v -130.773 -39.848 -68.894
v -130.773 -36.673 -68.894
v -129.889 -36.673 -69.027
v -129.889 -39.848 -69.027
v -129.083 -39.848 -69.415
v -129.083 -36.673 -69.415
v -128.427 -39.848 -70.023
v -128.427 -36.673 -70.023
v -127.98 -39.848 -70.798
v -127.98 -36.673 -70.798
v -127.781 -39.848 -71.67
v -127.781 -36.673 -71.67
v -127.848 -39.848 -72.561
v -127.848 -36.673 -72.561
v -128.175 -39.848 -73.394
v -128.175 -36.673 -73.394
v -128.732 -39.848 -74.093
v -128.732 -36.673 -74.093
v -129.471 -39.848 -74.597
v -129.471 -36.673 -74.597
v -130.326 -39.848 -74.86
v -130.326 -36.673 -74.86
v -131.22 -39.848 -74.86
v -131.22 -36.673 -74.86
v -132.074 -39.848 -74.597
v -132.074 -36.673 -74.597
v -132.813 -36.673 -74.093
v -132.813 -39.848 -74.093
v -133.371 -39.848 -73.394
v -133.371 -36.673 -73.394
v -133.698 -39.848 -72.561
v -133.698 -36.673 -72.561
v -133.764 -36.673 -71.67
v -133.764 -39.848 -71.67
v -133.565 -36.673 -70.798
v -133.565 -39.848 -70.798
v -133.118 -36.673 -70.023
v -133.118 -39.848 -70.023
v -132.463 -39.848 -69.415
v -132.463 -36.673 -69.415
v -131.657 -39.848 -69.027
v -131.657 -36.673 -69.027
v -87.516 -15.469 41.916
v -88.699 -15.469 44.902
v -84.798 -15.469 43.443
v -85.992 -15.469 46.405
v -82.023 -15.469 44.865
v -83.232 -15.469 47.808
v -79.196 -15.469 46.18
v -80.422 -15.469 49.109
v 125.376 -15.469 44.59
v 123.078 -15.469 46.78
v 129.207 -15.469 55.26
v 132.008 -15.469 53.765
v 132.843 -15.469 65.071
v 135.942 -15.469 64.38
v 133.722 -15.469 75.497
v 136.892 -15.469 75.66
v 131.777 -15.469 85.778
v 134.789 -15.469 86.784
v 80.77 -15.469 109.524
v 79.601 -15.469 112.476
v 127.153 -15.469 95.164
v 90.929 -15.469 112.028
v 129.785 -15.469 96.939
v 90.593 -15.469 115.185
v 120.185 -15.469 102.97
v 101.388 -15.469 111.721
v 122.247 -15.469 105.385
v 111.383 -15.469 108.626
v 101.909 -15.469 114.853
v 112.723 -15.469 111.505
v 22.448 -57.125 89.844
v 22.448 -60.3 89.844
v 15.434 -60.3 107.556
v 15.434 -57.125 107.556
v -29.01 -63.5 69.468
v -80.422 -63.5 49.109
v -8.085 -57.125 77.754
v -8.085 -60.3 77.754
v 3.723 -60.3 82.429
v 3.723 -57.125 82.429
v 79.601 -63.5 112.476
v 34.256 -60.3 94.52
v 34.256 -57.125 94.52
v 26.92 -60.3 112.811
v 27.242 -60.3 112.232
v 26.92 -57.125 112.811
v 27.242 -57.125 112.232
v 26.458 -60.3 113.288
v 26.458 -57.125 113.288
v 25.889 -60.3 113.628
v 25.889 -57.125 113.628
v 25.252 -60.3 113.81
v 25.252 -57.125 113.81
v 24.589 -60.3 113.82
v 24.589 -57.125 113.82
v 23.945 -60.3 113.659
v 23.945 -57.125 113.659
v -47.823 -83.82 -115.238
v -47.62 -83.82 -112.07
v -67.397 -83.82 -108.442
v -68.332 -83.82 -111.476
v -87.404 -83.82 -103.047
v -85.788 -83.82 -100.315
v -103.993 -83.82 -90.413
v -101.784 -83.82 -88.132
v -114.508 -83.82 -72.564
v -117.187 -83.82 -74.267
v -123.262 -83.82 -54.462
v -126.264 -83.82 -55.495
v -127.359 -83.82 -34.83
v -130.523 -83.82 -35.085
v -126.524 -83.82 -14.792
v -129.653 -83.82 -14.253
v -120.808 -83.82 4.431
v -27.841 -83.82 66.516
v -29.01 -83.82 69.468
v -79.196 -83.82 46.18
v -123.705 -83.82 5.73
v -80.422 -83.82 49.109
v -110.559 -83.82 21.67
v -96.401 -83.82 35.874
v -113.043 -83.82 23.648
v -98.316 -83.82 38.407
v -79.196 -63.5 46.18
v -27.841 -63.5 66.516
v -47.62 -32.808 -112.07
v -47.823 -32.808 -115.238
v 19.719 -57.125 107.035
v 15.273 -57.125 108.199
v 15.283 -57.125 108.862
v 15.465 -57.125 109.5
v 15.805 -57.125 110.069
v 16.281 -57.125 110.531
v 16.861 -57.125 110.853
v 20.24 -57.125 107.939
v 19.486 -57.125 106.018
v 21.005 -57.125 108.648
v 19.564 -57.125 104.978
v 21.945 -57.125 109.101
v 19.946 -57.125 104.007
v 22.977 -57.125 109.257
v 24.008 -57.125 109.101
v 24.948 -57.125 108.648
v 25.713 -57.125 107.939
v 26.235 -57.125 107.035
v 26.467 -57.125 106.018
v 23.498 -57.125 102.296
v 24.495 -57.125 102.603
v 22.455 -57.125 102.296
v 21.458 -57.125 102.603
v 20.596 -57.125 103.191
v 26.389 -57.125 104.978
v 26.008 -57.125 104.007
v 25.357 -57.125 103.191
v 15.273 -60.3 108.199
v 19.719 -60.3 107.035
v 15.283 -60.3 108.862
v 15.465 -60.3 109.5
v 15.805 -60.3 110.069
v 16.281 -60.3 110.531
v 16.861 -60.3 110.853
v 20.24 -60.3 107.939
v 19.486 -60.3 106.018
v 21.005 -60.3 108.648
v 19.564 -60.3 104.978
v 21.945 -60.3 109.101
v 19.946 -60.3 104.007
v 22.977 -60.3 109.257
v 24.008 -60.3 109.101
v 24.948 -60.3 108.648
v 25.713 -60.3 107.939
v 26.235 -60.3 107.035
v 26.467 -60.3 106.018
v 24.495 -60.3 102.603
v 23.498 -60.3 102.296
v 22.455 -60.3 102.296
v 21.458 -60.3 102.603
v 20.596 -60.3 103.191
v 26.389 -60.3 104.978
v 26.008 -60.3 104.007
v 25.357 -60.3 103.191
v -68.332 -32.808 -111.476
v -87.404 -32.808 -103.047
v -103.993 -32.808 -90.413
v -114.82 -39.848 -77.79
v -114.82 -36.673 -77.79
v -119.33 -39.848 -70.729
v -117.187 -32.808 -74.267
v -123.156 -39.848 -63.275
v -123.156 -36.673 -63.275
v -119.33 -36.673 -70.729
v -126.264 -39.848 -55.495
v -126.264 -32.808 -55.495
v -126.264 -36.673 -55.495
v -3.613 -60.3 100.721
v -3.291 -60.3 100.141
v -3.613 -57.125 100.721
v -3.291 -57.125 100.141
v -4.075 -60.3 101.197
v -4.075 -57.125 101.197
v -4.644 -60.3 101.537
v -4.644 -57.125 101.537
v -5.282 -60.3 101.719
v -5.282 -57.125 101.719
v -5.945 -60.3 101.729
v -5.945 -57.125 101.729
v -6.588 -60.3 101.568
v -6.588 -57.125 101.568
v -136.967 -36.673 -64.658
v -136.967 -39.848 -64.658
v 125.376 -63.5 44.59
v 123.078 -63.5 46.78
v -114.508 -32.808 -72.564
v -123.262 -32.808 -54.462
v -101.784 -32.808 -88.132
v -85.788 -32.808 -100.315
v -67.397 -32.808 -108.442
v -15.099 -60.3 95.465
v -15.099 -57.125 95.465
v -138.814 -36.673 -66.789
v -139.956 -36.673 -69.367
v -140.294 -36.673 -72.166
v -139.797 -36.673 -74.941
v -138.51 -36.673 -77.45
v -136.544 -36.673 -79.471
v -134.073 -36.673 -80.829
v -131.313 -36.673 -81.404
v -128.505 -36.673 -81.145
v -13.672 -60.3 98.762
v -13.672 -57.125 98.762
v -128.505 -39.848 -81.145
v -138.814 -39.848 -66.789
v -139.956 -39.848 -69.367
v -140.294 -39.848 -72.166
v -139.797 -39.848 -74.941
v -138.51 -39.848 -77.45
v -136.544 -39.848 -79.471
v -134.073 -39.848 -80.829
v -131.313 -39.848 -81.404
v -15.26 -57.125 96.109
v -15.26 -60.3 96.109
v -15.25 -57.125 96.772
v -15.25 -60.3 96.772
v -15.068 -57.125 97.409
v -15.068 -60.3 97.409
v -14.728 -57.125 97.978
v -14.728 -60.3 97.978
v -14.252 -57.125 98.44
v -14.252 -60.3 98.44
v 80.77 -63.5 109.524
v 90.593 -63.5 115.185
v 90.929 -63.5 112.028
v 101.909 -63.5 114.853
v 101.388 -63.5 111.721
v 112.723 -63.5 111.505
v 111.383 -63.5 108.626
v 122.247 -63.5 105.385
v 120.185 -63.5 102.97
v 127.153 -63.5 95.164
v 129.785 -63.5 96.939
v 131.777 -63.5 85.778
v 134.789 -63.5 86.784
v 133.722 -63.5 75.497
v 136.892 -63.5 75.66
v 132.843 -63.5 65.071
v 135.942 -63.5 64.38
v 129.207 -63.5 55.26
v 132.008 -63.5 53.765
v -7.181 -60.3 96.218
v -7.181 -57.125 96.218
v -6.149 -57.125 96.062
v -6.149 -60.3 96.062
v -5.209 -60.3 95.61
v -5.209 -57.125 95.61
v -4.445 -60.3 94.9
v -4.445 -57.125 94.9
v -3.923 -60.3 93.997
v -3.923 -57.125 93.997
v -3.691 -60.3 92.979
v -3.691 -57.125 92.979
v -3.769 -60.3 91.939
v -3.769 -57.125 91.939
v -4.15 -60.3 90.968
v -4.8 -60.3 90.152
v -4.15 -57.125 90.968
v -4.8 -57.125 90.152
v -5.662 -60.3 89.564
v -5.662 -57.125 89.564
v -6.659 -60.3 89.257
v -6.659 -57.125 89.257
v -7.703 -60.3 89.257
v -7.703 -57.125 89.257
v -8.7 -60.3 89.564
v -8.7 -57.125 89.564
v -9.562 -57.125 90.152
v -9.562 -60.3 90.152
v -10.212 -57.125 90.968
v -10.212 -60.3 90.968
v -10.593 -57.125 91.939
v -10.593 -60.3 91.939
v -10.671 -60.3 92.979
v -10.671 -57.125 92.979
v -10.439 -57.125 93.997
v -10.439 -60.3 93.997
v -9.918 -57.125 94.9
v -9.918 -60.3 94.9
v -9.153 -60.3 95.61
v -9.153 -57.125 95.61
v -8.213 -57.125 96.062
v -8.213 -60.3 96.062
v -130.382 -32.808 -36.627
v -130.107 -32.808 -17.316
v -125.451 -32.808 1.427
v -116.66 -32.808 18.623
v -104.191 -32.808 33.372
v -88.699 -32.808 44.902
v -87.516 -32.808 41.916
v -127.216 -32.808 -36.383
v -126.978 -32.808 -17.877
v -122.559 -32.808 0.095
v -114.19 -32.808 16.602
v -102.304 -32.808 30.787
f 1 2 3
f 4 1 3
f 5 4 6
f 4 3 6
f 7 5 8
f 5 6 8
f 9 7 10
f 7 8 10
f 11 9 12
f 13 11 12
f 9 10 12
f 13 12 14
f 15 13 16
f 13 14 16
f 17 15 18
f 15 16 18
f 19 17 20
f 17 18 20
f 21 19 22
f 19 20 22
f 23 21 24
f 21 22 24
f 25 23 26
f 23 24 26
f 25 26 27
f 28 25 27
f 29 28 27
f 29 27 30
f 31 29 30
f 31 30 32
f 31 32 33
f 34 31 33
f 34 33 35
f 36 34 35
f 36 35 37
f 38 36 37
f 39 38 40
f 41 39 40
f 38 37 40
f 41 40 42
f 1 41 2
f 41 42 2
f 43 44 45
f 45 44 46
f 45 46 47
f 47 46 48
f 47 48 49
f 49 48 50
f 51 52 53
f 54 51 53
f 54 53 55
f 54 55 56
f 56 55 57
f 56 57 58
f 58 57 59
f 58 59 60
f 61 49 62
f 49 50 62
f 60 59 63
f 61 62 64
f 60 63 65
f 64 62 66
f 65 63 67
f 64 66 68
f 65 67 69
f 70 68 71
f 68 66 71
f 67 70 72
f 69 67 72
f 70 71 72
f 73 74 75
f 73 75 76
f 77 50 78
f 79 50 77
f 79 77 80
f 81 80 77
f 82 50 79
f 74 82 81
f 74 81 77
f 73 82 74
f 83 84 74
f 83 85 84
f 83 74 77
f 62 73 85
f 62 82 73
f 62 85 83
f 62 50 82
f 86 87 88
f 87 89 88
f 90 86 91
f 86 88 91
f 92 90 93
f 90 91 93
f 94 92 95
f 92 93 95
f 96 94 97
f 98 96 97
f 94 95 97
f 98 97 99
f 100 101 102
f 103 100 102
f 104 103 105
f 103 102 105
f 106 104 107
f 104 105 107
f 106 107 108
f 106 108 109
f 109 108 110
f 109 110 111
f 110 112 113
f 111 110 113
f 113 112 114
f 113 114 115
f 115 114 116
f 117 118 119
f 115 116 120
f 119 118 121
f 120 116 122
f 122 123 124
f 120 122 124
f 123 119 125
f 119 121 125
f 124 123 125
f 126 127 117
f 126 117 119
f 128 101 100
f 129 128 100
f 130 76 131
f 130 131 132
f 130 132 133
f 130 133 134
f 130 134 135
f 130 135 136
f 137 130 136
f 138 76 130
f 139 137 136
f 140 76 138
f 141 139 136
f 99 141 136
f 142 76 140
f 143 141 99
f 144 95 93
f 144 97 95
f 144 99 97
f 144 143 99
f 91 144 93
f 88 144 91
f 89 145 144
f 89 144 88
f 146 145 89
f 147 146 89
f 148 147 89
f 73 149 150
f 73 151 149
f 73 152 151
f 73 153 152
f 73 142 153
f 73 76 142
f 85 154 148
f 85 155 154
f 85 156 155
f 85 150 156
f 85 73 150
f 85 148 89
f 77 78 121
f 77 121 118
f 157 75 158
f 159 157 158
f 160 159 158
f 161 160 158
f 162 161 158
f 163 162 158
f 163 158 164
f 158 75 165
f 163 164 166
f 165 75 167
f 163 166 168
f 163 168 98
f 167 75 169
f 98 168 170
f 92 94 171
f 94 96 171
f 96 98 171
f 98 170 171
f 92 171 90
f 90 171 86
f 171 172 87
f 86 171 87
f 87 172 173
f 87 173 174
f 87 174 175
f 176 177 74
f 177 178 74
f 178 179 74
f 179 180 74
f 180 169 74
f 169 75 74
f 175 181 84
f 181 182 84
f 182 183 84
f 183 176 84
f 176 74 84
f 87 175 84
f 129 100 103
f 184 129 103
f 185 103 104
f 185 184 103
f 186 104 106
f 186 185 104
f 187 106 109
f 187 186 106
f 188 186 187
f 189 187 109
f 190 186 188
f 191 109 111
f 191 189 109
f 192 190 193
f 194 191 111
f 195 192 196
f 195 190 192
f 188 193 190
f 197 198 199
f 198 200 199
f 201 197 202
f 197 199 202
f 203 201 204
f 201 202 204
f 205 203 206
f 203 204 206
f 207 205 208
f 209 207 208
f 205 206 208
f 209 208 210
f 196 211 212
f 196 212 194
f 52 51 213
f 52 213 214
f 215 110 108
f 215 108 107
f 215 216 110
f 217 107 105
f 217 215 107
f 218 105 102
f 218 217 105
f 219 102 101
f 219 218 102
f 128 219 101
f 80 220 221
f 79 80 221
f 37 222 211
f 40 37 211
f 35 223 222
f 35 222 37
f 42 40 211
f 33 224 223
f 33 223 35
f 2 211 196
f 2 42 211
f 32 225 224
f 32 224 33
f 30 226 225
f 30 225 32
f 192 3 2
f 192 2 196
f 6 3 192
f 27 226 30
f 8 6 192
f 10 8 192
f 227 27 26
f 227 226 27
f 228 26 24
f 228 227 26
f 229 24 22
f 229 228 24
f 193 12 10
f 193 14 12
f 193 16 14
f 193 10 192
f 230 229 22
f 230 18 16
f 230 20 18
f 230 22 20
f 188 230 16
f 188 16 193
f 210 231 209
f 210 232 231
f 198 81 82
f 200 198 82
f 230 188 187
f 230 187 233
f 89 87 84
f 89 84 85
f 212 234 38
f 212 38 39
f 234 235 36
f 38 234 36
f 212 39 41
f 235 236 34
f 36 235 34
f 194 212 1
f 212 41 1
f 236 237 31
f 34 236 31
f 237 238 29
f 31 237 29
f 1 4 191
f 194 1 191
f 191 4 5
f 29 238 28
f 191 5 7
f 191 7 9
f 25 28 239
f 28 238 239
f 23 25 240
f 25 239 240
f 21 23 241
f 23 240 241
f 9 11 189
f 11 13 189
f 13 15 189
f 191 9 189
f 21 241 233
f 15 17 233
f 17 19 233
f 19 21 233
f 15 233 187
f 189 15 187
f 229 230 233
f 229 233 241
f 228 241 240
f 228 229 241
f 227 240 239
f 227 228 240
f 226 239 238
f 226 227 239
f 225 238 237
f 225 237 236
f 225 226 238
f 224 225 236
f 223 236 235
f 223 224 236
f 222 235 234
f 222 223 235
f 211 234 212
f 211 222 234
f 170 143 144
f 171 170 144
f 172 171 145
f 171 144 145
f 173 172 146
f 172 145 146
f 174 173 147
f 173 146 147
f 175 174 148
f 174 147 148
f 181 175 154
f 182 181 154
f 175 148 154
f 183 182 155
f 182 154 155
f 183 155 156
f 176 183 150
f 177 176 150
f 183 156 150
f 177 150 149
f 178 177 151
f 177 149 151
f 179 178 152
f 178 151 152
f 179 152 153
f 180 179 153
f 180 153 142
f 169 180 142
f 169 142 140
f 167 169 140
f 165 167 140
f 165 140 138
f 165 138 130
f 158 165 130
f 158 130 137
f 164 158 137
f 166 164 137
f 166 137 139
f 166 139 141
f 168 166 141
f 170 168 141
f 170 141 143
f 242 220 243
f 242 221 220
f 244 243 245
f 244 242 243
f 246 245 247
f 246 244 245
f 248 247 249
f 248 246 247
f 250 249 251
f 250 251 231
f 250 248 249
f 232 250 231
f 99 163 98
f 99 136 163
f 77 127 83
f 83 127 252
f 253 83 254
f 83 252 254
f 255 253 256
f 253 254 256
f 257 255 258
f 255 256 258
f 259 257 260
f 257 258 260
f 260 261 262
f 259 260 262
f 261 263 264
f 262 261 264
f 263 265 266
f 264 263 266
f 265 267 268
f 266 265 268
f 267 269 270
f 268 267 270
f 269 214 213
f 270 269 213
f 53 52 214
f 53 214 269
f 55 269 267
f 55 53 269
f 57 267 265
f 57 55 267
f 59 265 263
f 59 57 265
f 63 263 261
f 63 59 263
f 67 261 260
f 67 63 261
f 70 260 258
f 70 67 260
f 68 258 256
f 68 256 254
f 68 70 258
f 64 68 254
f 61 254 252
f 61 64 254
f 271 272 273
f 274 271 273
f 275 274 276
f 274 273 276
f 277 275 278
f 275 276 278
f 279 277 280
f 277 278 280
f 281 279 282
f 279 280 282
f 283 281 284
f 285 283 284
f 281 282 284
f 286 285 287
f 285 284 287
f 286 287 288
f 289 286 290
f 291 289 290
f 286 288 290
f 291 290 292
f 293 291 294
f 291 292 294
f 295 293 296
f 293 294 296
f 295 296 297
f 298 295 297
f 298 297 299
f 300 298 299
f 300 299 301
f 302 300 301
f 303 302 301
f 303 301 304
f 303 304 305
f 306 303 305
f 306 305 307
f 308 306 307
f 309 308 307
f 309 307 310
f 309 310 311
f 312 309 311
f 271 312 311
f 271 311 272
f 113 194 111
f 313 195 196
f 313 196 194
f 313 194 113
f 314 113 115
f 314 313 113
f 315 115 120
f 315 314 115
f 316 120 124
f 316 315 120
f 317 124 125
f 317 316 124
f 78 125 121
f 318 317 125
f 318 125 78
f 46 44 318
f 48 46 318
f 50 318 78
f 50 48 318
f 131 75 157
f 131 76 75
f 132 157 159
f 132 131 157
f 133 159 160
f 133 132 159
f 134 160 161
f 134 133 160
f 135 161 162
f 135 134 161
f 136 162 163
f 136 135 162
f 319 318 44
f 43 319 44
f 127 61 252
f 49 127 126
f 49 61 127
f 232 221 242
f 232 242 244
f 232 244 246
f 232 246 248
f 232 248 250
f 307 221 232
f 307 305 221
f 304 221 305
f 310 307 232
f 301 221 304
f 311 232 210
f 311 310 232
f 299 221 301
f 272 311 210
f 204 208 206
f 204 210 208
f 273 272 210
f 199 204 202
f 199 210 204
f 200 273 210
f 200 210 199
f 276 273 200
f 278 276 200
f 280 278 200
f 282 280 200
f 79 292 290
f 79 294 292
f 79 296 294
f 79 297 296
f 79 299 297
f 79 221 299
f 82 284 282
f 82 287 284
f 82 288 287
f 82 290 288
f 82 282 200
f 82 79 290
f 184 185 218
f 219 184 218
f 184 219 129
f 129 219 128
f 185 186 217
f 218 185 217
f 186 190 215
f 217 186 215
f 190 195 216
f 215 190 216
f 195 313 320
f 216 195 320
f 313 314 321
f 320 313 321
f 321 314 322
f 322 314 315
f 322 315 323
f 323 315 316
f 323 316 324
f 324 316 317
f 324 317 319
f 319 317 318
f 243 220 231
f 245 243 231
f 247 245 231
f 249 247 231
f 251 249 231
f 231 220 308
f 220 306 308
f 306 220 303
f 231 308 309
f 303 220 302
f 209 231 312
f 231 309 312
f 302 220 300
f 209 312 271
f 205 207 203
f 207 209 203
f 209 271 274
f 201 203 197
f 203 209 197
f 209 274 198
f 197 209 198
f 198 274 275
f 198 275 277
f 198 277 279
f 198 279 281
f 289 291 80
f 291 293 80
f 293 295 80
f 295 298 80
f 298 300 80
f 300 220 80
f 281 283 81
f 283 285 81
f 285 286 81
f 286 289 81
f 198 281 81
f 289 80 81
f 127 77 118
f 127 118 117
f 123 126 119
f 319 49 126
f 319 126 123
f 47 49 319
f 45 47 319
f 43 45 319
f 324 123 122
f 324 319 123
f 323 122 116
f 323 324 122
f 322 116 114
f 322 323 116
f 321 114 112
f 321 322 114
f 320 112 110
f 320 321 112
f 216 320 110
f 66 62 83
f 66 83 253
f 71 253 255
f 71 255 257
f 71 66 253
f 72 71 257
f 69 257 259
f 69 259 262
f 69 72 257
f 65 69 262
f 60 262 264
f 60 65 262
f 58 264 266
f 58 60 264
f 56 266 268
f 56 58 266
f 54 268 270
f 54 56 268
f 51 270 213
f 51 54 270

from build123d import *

# Parameters (mm, degrees)
BASE_FLANGE2_DEPTH  = 63.5
SKETCH8_W           = 331.965977541
SKETCH8_H           = 30.9372
CUT_EXTRUDE1_DEPTH  = 256.834789278
SKETCH9_W           = 150.054784792
SKETCH9_H           = 34.679027416
CUT_EXTRUDE2_DEPTH  = 256.834789278
BOSS_EXTRUDE1_DEPTH = 20.32
SKETCH12_W          = 12.7
SKETCH12_H          = 3.175
BOSS_EXTRUDE2_DEPTH = 21.59
SKETCH13_R          = 3.5
CUT_EXTRUDE5_DEPTH  = 21.59
FILLET1_R           = 2.54
SKETCH14_R          = 3
BOSS_EXTRUDE3_DEPTH = 3.175


# Sheet-metal steps are written as plain solids
with BuildPart() as part:
    # Sketch1 → Base-Flange2 (new body)
    with BuildSketch(Plane(origin=(0, 0, 0), x_dir=(1, 0, 0), z_dir=(0, 1, 0))):
        with BuildLine():
            Line((80.769724328, -109.524319493), (-79.196155859, -46.179527064))
            ThreePointArc((-79.196155859, -46.179527064), (-120.807882744, -4.431069312), (-123.261655777, 54.4624663))
            ThreePointArc((-123.261655777, 54.4624663), (-94.143629301, 94.693559024), (-47.619751411, 112.069665426))
            Line((-47.619751411, 112.069665426), (-47.822872467, 115.238161415))
            ThreePointArc((-47.822872467, 115.238161415), (-96.069602275, 97.217694761), (-126.264058949, 55.495051727))
            ThreePointArc((-126.264058949, 55.495051727), (-123.704959468, -5.730431564), (-80.422032808, -49.108963745))
            Line((-80.422032808, -49.108963745), (79.600772216, -112.476297806))
            ThreePointArc((79.600772216, -112.476297806), (129.785334621, -96.938999369), (125.376413714, -44.589602401))
            Line((125.376413714, -44.589602401), (123.077927873, -46.779942064))
            ThreePointArc((123.077927873, -46.779942064), (127.152879464, -95.163948708), (80.769724328, -109.524319493))
        make_face()
    extrude(amount=-BASE_FLANGE2_DEPTH)

    # Sketch8 → Cut-Extrude1 (cut, through all)
    with BuildSketch(Plane(origin=(-27.711967852, 0, 69.98159058), x_dir=(0.9297569489485495, 0, 0.36817389353657926), z_dir=(-0.36817389353657926, 0, 0.9297569489485495))):
        with Locations((13.838804259, 0)):
            Rectangle(SKETCH8_W, SKETCH8_H)
    extrude(amount=-CUT_EXTRUDE1_DEPTH, mode=Mode.SUBTRACT)

    # Sketch9 → Cut-Extrude2 (cut, through all)
    with BuildSketch(Plane(origin=(-27.711967852, 0, 69.98159058), x_dir=(0.9297569489485495, 0, 0.36817389353657926), z_dir=(-0.36817389353657926, 0, 0.9297569489485495))):
        with Locations((-140.963680017, -15.4686)):
            Rectangle(SKETCH9_W, SKETCH9_H)
    extrude(amount=-CUT_EXTRUDE2_DEPTH, mode=Mode.SUBTRACT)

    # Sketch11 → Boss-Extrude1 (add)
    with BuildSketch(Plane.XZ.offset(63.5)):
        with BuildLine():
            Line((-47.619751411, -112.069665426), (-47.822872467, -115.238161415))
            ThreePointArc((-47.822872467, -115.238161415), (-96.069602275, -97.217694761), (-126.264058949, -55.495051727))
            ThreePointArc((-126.264058949, -55.495051727), (-123.704959468, 5.730431564), (-80.422032808, 49.108963745))
            Line((-80.422032808, 49.108963745), (-29.009735812, 69.467688228))
            Line((-29.009735812, 69.467688228), (-27.8407837, 66.515709916))
            Line((-27.8407837, 66.515709916), (-79.196155859, 46.179527064))
            ThreePointArc((-79.196155859, 46.179527064), (-120.807882744, 4.431069312), (-123.261655777, -54.4624663))
            ThreePointArc((-123.261655777, -54.4624663), (-94.143629301, -94.693559024), (-47.619751411, -112.069665426))
        make_face()
    extrude(amount=BOSS_EXTRUDE1_DEPTH)

    # Sketch12 → Boss-Extrude2 (add)
    with BuildSketch(Plane(origin=(-27.711967852, 0, 69.98159058), x_dir=(0.9297569489485495, 0, 0.3681738935365793), z_dir=(-0.36817389353657937, 0, 0.9297569489485495))):
        with Locations((27.459636868, -58.7121)):
            Rectangle(SKETCH12_W, SKETCH12_H)
        with Locations((60.299587615, -58.7121)):
            Rectangle(SKETCH12_W, SKETCH12_H)
    extrude(amount=BOSS_EXTRUDE2_DEPTH)

    # Sketch13 → Cut-Extrude5 (cut)
    with BuildSketch(Plane(origin=(0, -57.1246, 0), x_dir=(1, 0, 0), z_dir=(0, 1, 0))):
        with Locations(Location((22.976705445, -105.756645834, 0), (0, 0, 270))):
            Circle(SKETCH13_R)
        with Locations(Location((-7.181091285, -92.717889538, 0), (0, 0, 270))):
            Circle(SKETCH13_R)
    extrude(amount=-CUT_EXTRUDE5_DEPTH, mode=Mode.SUBTRACT)

    # Fillet1
    fillet1_edges = [part.edges().sort_by_distance(p)[0] for p in [
        (-4.226097394, -58.7121, 102.502868753),
        (-16.034010646, -58.7121, 97.827060305),
        (26.307075016, -58.7121, 114.593681283),
        (14.499161765, -58.7121, 109.917872835),
    ]]
    fillet(fillet1_edges, radius=FILLET1_R)

    # Sketch14 → Boss-Extrude3 (add)
    with BuildSketch(Plane(origin=(0, -36.672703388, 0), x_dir=(1, 0, 0), z_dir=(0, 1, 0))):
        with BuildLine():
            Line((-136.967303974, 64.658320793), (-126.264058949, 55.495051727))
            ThreePointArc((-126.264058949, 55.495051727), (-121.330527713, 67.047255445), (-114.82018179, 77.790091998))
            Line((-114.82018179, 77.790091998), (-128.504840161, 81.144951055))
            ThreePointArc((-128.504840161, 81.144951055), (-139.246667683, 76.243475882), (-136.967303974, 64.658320793))
        make_face()
        with Locations(Location((-130.77278095, 71.8938933, 0), (0, 0, 270))):
            Circle(SKETCH14_R, mode=Mode.SUBTRACT)
    extrude(amount=-BOSS_EXTRUDE3_DEPTH)


solid = part.part
